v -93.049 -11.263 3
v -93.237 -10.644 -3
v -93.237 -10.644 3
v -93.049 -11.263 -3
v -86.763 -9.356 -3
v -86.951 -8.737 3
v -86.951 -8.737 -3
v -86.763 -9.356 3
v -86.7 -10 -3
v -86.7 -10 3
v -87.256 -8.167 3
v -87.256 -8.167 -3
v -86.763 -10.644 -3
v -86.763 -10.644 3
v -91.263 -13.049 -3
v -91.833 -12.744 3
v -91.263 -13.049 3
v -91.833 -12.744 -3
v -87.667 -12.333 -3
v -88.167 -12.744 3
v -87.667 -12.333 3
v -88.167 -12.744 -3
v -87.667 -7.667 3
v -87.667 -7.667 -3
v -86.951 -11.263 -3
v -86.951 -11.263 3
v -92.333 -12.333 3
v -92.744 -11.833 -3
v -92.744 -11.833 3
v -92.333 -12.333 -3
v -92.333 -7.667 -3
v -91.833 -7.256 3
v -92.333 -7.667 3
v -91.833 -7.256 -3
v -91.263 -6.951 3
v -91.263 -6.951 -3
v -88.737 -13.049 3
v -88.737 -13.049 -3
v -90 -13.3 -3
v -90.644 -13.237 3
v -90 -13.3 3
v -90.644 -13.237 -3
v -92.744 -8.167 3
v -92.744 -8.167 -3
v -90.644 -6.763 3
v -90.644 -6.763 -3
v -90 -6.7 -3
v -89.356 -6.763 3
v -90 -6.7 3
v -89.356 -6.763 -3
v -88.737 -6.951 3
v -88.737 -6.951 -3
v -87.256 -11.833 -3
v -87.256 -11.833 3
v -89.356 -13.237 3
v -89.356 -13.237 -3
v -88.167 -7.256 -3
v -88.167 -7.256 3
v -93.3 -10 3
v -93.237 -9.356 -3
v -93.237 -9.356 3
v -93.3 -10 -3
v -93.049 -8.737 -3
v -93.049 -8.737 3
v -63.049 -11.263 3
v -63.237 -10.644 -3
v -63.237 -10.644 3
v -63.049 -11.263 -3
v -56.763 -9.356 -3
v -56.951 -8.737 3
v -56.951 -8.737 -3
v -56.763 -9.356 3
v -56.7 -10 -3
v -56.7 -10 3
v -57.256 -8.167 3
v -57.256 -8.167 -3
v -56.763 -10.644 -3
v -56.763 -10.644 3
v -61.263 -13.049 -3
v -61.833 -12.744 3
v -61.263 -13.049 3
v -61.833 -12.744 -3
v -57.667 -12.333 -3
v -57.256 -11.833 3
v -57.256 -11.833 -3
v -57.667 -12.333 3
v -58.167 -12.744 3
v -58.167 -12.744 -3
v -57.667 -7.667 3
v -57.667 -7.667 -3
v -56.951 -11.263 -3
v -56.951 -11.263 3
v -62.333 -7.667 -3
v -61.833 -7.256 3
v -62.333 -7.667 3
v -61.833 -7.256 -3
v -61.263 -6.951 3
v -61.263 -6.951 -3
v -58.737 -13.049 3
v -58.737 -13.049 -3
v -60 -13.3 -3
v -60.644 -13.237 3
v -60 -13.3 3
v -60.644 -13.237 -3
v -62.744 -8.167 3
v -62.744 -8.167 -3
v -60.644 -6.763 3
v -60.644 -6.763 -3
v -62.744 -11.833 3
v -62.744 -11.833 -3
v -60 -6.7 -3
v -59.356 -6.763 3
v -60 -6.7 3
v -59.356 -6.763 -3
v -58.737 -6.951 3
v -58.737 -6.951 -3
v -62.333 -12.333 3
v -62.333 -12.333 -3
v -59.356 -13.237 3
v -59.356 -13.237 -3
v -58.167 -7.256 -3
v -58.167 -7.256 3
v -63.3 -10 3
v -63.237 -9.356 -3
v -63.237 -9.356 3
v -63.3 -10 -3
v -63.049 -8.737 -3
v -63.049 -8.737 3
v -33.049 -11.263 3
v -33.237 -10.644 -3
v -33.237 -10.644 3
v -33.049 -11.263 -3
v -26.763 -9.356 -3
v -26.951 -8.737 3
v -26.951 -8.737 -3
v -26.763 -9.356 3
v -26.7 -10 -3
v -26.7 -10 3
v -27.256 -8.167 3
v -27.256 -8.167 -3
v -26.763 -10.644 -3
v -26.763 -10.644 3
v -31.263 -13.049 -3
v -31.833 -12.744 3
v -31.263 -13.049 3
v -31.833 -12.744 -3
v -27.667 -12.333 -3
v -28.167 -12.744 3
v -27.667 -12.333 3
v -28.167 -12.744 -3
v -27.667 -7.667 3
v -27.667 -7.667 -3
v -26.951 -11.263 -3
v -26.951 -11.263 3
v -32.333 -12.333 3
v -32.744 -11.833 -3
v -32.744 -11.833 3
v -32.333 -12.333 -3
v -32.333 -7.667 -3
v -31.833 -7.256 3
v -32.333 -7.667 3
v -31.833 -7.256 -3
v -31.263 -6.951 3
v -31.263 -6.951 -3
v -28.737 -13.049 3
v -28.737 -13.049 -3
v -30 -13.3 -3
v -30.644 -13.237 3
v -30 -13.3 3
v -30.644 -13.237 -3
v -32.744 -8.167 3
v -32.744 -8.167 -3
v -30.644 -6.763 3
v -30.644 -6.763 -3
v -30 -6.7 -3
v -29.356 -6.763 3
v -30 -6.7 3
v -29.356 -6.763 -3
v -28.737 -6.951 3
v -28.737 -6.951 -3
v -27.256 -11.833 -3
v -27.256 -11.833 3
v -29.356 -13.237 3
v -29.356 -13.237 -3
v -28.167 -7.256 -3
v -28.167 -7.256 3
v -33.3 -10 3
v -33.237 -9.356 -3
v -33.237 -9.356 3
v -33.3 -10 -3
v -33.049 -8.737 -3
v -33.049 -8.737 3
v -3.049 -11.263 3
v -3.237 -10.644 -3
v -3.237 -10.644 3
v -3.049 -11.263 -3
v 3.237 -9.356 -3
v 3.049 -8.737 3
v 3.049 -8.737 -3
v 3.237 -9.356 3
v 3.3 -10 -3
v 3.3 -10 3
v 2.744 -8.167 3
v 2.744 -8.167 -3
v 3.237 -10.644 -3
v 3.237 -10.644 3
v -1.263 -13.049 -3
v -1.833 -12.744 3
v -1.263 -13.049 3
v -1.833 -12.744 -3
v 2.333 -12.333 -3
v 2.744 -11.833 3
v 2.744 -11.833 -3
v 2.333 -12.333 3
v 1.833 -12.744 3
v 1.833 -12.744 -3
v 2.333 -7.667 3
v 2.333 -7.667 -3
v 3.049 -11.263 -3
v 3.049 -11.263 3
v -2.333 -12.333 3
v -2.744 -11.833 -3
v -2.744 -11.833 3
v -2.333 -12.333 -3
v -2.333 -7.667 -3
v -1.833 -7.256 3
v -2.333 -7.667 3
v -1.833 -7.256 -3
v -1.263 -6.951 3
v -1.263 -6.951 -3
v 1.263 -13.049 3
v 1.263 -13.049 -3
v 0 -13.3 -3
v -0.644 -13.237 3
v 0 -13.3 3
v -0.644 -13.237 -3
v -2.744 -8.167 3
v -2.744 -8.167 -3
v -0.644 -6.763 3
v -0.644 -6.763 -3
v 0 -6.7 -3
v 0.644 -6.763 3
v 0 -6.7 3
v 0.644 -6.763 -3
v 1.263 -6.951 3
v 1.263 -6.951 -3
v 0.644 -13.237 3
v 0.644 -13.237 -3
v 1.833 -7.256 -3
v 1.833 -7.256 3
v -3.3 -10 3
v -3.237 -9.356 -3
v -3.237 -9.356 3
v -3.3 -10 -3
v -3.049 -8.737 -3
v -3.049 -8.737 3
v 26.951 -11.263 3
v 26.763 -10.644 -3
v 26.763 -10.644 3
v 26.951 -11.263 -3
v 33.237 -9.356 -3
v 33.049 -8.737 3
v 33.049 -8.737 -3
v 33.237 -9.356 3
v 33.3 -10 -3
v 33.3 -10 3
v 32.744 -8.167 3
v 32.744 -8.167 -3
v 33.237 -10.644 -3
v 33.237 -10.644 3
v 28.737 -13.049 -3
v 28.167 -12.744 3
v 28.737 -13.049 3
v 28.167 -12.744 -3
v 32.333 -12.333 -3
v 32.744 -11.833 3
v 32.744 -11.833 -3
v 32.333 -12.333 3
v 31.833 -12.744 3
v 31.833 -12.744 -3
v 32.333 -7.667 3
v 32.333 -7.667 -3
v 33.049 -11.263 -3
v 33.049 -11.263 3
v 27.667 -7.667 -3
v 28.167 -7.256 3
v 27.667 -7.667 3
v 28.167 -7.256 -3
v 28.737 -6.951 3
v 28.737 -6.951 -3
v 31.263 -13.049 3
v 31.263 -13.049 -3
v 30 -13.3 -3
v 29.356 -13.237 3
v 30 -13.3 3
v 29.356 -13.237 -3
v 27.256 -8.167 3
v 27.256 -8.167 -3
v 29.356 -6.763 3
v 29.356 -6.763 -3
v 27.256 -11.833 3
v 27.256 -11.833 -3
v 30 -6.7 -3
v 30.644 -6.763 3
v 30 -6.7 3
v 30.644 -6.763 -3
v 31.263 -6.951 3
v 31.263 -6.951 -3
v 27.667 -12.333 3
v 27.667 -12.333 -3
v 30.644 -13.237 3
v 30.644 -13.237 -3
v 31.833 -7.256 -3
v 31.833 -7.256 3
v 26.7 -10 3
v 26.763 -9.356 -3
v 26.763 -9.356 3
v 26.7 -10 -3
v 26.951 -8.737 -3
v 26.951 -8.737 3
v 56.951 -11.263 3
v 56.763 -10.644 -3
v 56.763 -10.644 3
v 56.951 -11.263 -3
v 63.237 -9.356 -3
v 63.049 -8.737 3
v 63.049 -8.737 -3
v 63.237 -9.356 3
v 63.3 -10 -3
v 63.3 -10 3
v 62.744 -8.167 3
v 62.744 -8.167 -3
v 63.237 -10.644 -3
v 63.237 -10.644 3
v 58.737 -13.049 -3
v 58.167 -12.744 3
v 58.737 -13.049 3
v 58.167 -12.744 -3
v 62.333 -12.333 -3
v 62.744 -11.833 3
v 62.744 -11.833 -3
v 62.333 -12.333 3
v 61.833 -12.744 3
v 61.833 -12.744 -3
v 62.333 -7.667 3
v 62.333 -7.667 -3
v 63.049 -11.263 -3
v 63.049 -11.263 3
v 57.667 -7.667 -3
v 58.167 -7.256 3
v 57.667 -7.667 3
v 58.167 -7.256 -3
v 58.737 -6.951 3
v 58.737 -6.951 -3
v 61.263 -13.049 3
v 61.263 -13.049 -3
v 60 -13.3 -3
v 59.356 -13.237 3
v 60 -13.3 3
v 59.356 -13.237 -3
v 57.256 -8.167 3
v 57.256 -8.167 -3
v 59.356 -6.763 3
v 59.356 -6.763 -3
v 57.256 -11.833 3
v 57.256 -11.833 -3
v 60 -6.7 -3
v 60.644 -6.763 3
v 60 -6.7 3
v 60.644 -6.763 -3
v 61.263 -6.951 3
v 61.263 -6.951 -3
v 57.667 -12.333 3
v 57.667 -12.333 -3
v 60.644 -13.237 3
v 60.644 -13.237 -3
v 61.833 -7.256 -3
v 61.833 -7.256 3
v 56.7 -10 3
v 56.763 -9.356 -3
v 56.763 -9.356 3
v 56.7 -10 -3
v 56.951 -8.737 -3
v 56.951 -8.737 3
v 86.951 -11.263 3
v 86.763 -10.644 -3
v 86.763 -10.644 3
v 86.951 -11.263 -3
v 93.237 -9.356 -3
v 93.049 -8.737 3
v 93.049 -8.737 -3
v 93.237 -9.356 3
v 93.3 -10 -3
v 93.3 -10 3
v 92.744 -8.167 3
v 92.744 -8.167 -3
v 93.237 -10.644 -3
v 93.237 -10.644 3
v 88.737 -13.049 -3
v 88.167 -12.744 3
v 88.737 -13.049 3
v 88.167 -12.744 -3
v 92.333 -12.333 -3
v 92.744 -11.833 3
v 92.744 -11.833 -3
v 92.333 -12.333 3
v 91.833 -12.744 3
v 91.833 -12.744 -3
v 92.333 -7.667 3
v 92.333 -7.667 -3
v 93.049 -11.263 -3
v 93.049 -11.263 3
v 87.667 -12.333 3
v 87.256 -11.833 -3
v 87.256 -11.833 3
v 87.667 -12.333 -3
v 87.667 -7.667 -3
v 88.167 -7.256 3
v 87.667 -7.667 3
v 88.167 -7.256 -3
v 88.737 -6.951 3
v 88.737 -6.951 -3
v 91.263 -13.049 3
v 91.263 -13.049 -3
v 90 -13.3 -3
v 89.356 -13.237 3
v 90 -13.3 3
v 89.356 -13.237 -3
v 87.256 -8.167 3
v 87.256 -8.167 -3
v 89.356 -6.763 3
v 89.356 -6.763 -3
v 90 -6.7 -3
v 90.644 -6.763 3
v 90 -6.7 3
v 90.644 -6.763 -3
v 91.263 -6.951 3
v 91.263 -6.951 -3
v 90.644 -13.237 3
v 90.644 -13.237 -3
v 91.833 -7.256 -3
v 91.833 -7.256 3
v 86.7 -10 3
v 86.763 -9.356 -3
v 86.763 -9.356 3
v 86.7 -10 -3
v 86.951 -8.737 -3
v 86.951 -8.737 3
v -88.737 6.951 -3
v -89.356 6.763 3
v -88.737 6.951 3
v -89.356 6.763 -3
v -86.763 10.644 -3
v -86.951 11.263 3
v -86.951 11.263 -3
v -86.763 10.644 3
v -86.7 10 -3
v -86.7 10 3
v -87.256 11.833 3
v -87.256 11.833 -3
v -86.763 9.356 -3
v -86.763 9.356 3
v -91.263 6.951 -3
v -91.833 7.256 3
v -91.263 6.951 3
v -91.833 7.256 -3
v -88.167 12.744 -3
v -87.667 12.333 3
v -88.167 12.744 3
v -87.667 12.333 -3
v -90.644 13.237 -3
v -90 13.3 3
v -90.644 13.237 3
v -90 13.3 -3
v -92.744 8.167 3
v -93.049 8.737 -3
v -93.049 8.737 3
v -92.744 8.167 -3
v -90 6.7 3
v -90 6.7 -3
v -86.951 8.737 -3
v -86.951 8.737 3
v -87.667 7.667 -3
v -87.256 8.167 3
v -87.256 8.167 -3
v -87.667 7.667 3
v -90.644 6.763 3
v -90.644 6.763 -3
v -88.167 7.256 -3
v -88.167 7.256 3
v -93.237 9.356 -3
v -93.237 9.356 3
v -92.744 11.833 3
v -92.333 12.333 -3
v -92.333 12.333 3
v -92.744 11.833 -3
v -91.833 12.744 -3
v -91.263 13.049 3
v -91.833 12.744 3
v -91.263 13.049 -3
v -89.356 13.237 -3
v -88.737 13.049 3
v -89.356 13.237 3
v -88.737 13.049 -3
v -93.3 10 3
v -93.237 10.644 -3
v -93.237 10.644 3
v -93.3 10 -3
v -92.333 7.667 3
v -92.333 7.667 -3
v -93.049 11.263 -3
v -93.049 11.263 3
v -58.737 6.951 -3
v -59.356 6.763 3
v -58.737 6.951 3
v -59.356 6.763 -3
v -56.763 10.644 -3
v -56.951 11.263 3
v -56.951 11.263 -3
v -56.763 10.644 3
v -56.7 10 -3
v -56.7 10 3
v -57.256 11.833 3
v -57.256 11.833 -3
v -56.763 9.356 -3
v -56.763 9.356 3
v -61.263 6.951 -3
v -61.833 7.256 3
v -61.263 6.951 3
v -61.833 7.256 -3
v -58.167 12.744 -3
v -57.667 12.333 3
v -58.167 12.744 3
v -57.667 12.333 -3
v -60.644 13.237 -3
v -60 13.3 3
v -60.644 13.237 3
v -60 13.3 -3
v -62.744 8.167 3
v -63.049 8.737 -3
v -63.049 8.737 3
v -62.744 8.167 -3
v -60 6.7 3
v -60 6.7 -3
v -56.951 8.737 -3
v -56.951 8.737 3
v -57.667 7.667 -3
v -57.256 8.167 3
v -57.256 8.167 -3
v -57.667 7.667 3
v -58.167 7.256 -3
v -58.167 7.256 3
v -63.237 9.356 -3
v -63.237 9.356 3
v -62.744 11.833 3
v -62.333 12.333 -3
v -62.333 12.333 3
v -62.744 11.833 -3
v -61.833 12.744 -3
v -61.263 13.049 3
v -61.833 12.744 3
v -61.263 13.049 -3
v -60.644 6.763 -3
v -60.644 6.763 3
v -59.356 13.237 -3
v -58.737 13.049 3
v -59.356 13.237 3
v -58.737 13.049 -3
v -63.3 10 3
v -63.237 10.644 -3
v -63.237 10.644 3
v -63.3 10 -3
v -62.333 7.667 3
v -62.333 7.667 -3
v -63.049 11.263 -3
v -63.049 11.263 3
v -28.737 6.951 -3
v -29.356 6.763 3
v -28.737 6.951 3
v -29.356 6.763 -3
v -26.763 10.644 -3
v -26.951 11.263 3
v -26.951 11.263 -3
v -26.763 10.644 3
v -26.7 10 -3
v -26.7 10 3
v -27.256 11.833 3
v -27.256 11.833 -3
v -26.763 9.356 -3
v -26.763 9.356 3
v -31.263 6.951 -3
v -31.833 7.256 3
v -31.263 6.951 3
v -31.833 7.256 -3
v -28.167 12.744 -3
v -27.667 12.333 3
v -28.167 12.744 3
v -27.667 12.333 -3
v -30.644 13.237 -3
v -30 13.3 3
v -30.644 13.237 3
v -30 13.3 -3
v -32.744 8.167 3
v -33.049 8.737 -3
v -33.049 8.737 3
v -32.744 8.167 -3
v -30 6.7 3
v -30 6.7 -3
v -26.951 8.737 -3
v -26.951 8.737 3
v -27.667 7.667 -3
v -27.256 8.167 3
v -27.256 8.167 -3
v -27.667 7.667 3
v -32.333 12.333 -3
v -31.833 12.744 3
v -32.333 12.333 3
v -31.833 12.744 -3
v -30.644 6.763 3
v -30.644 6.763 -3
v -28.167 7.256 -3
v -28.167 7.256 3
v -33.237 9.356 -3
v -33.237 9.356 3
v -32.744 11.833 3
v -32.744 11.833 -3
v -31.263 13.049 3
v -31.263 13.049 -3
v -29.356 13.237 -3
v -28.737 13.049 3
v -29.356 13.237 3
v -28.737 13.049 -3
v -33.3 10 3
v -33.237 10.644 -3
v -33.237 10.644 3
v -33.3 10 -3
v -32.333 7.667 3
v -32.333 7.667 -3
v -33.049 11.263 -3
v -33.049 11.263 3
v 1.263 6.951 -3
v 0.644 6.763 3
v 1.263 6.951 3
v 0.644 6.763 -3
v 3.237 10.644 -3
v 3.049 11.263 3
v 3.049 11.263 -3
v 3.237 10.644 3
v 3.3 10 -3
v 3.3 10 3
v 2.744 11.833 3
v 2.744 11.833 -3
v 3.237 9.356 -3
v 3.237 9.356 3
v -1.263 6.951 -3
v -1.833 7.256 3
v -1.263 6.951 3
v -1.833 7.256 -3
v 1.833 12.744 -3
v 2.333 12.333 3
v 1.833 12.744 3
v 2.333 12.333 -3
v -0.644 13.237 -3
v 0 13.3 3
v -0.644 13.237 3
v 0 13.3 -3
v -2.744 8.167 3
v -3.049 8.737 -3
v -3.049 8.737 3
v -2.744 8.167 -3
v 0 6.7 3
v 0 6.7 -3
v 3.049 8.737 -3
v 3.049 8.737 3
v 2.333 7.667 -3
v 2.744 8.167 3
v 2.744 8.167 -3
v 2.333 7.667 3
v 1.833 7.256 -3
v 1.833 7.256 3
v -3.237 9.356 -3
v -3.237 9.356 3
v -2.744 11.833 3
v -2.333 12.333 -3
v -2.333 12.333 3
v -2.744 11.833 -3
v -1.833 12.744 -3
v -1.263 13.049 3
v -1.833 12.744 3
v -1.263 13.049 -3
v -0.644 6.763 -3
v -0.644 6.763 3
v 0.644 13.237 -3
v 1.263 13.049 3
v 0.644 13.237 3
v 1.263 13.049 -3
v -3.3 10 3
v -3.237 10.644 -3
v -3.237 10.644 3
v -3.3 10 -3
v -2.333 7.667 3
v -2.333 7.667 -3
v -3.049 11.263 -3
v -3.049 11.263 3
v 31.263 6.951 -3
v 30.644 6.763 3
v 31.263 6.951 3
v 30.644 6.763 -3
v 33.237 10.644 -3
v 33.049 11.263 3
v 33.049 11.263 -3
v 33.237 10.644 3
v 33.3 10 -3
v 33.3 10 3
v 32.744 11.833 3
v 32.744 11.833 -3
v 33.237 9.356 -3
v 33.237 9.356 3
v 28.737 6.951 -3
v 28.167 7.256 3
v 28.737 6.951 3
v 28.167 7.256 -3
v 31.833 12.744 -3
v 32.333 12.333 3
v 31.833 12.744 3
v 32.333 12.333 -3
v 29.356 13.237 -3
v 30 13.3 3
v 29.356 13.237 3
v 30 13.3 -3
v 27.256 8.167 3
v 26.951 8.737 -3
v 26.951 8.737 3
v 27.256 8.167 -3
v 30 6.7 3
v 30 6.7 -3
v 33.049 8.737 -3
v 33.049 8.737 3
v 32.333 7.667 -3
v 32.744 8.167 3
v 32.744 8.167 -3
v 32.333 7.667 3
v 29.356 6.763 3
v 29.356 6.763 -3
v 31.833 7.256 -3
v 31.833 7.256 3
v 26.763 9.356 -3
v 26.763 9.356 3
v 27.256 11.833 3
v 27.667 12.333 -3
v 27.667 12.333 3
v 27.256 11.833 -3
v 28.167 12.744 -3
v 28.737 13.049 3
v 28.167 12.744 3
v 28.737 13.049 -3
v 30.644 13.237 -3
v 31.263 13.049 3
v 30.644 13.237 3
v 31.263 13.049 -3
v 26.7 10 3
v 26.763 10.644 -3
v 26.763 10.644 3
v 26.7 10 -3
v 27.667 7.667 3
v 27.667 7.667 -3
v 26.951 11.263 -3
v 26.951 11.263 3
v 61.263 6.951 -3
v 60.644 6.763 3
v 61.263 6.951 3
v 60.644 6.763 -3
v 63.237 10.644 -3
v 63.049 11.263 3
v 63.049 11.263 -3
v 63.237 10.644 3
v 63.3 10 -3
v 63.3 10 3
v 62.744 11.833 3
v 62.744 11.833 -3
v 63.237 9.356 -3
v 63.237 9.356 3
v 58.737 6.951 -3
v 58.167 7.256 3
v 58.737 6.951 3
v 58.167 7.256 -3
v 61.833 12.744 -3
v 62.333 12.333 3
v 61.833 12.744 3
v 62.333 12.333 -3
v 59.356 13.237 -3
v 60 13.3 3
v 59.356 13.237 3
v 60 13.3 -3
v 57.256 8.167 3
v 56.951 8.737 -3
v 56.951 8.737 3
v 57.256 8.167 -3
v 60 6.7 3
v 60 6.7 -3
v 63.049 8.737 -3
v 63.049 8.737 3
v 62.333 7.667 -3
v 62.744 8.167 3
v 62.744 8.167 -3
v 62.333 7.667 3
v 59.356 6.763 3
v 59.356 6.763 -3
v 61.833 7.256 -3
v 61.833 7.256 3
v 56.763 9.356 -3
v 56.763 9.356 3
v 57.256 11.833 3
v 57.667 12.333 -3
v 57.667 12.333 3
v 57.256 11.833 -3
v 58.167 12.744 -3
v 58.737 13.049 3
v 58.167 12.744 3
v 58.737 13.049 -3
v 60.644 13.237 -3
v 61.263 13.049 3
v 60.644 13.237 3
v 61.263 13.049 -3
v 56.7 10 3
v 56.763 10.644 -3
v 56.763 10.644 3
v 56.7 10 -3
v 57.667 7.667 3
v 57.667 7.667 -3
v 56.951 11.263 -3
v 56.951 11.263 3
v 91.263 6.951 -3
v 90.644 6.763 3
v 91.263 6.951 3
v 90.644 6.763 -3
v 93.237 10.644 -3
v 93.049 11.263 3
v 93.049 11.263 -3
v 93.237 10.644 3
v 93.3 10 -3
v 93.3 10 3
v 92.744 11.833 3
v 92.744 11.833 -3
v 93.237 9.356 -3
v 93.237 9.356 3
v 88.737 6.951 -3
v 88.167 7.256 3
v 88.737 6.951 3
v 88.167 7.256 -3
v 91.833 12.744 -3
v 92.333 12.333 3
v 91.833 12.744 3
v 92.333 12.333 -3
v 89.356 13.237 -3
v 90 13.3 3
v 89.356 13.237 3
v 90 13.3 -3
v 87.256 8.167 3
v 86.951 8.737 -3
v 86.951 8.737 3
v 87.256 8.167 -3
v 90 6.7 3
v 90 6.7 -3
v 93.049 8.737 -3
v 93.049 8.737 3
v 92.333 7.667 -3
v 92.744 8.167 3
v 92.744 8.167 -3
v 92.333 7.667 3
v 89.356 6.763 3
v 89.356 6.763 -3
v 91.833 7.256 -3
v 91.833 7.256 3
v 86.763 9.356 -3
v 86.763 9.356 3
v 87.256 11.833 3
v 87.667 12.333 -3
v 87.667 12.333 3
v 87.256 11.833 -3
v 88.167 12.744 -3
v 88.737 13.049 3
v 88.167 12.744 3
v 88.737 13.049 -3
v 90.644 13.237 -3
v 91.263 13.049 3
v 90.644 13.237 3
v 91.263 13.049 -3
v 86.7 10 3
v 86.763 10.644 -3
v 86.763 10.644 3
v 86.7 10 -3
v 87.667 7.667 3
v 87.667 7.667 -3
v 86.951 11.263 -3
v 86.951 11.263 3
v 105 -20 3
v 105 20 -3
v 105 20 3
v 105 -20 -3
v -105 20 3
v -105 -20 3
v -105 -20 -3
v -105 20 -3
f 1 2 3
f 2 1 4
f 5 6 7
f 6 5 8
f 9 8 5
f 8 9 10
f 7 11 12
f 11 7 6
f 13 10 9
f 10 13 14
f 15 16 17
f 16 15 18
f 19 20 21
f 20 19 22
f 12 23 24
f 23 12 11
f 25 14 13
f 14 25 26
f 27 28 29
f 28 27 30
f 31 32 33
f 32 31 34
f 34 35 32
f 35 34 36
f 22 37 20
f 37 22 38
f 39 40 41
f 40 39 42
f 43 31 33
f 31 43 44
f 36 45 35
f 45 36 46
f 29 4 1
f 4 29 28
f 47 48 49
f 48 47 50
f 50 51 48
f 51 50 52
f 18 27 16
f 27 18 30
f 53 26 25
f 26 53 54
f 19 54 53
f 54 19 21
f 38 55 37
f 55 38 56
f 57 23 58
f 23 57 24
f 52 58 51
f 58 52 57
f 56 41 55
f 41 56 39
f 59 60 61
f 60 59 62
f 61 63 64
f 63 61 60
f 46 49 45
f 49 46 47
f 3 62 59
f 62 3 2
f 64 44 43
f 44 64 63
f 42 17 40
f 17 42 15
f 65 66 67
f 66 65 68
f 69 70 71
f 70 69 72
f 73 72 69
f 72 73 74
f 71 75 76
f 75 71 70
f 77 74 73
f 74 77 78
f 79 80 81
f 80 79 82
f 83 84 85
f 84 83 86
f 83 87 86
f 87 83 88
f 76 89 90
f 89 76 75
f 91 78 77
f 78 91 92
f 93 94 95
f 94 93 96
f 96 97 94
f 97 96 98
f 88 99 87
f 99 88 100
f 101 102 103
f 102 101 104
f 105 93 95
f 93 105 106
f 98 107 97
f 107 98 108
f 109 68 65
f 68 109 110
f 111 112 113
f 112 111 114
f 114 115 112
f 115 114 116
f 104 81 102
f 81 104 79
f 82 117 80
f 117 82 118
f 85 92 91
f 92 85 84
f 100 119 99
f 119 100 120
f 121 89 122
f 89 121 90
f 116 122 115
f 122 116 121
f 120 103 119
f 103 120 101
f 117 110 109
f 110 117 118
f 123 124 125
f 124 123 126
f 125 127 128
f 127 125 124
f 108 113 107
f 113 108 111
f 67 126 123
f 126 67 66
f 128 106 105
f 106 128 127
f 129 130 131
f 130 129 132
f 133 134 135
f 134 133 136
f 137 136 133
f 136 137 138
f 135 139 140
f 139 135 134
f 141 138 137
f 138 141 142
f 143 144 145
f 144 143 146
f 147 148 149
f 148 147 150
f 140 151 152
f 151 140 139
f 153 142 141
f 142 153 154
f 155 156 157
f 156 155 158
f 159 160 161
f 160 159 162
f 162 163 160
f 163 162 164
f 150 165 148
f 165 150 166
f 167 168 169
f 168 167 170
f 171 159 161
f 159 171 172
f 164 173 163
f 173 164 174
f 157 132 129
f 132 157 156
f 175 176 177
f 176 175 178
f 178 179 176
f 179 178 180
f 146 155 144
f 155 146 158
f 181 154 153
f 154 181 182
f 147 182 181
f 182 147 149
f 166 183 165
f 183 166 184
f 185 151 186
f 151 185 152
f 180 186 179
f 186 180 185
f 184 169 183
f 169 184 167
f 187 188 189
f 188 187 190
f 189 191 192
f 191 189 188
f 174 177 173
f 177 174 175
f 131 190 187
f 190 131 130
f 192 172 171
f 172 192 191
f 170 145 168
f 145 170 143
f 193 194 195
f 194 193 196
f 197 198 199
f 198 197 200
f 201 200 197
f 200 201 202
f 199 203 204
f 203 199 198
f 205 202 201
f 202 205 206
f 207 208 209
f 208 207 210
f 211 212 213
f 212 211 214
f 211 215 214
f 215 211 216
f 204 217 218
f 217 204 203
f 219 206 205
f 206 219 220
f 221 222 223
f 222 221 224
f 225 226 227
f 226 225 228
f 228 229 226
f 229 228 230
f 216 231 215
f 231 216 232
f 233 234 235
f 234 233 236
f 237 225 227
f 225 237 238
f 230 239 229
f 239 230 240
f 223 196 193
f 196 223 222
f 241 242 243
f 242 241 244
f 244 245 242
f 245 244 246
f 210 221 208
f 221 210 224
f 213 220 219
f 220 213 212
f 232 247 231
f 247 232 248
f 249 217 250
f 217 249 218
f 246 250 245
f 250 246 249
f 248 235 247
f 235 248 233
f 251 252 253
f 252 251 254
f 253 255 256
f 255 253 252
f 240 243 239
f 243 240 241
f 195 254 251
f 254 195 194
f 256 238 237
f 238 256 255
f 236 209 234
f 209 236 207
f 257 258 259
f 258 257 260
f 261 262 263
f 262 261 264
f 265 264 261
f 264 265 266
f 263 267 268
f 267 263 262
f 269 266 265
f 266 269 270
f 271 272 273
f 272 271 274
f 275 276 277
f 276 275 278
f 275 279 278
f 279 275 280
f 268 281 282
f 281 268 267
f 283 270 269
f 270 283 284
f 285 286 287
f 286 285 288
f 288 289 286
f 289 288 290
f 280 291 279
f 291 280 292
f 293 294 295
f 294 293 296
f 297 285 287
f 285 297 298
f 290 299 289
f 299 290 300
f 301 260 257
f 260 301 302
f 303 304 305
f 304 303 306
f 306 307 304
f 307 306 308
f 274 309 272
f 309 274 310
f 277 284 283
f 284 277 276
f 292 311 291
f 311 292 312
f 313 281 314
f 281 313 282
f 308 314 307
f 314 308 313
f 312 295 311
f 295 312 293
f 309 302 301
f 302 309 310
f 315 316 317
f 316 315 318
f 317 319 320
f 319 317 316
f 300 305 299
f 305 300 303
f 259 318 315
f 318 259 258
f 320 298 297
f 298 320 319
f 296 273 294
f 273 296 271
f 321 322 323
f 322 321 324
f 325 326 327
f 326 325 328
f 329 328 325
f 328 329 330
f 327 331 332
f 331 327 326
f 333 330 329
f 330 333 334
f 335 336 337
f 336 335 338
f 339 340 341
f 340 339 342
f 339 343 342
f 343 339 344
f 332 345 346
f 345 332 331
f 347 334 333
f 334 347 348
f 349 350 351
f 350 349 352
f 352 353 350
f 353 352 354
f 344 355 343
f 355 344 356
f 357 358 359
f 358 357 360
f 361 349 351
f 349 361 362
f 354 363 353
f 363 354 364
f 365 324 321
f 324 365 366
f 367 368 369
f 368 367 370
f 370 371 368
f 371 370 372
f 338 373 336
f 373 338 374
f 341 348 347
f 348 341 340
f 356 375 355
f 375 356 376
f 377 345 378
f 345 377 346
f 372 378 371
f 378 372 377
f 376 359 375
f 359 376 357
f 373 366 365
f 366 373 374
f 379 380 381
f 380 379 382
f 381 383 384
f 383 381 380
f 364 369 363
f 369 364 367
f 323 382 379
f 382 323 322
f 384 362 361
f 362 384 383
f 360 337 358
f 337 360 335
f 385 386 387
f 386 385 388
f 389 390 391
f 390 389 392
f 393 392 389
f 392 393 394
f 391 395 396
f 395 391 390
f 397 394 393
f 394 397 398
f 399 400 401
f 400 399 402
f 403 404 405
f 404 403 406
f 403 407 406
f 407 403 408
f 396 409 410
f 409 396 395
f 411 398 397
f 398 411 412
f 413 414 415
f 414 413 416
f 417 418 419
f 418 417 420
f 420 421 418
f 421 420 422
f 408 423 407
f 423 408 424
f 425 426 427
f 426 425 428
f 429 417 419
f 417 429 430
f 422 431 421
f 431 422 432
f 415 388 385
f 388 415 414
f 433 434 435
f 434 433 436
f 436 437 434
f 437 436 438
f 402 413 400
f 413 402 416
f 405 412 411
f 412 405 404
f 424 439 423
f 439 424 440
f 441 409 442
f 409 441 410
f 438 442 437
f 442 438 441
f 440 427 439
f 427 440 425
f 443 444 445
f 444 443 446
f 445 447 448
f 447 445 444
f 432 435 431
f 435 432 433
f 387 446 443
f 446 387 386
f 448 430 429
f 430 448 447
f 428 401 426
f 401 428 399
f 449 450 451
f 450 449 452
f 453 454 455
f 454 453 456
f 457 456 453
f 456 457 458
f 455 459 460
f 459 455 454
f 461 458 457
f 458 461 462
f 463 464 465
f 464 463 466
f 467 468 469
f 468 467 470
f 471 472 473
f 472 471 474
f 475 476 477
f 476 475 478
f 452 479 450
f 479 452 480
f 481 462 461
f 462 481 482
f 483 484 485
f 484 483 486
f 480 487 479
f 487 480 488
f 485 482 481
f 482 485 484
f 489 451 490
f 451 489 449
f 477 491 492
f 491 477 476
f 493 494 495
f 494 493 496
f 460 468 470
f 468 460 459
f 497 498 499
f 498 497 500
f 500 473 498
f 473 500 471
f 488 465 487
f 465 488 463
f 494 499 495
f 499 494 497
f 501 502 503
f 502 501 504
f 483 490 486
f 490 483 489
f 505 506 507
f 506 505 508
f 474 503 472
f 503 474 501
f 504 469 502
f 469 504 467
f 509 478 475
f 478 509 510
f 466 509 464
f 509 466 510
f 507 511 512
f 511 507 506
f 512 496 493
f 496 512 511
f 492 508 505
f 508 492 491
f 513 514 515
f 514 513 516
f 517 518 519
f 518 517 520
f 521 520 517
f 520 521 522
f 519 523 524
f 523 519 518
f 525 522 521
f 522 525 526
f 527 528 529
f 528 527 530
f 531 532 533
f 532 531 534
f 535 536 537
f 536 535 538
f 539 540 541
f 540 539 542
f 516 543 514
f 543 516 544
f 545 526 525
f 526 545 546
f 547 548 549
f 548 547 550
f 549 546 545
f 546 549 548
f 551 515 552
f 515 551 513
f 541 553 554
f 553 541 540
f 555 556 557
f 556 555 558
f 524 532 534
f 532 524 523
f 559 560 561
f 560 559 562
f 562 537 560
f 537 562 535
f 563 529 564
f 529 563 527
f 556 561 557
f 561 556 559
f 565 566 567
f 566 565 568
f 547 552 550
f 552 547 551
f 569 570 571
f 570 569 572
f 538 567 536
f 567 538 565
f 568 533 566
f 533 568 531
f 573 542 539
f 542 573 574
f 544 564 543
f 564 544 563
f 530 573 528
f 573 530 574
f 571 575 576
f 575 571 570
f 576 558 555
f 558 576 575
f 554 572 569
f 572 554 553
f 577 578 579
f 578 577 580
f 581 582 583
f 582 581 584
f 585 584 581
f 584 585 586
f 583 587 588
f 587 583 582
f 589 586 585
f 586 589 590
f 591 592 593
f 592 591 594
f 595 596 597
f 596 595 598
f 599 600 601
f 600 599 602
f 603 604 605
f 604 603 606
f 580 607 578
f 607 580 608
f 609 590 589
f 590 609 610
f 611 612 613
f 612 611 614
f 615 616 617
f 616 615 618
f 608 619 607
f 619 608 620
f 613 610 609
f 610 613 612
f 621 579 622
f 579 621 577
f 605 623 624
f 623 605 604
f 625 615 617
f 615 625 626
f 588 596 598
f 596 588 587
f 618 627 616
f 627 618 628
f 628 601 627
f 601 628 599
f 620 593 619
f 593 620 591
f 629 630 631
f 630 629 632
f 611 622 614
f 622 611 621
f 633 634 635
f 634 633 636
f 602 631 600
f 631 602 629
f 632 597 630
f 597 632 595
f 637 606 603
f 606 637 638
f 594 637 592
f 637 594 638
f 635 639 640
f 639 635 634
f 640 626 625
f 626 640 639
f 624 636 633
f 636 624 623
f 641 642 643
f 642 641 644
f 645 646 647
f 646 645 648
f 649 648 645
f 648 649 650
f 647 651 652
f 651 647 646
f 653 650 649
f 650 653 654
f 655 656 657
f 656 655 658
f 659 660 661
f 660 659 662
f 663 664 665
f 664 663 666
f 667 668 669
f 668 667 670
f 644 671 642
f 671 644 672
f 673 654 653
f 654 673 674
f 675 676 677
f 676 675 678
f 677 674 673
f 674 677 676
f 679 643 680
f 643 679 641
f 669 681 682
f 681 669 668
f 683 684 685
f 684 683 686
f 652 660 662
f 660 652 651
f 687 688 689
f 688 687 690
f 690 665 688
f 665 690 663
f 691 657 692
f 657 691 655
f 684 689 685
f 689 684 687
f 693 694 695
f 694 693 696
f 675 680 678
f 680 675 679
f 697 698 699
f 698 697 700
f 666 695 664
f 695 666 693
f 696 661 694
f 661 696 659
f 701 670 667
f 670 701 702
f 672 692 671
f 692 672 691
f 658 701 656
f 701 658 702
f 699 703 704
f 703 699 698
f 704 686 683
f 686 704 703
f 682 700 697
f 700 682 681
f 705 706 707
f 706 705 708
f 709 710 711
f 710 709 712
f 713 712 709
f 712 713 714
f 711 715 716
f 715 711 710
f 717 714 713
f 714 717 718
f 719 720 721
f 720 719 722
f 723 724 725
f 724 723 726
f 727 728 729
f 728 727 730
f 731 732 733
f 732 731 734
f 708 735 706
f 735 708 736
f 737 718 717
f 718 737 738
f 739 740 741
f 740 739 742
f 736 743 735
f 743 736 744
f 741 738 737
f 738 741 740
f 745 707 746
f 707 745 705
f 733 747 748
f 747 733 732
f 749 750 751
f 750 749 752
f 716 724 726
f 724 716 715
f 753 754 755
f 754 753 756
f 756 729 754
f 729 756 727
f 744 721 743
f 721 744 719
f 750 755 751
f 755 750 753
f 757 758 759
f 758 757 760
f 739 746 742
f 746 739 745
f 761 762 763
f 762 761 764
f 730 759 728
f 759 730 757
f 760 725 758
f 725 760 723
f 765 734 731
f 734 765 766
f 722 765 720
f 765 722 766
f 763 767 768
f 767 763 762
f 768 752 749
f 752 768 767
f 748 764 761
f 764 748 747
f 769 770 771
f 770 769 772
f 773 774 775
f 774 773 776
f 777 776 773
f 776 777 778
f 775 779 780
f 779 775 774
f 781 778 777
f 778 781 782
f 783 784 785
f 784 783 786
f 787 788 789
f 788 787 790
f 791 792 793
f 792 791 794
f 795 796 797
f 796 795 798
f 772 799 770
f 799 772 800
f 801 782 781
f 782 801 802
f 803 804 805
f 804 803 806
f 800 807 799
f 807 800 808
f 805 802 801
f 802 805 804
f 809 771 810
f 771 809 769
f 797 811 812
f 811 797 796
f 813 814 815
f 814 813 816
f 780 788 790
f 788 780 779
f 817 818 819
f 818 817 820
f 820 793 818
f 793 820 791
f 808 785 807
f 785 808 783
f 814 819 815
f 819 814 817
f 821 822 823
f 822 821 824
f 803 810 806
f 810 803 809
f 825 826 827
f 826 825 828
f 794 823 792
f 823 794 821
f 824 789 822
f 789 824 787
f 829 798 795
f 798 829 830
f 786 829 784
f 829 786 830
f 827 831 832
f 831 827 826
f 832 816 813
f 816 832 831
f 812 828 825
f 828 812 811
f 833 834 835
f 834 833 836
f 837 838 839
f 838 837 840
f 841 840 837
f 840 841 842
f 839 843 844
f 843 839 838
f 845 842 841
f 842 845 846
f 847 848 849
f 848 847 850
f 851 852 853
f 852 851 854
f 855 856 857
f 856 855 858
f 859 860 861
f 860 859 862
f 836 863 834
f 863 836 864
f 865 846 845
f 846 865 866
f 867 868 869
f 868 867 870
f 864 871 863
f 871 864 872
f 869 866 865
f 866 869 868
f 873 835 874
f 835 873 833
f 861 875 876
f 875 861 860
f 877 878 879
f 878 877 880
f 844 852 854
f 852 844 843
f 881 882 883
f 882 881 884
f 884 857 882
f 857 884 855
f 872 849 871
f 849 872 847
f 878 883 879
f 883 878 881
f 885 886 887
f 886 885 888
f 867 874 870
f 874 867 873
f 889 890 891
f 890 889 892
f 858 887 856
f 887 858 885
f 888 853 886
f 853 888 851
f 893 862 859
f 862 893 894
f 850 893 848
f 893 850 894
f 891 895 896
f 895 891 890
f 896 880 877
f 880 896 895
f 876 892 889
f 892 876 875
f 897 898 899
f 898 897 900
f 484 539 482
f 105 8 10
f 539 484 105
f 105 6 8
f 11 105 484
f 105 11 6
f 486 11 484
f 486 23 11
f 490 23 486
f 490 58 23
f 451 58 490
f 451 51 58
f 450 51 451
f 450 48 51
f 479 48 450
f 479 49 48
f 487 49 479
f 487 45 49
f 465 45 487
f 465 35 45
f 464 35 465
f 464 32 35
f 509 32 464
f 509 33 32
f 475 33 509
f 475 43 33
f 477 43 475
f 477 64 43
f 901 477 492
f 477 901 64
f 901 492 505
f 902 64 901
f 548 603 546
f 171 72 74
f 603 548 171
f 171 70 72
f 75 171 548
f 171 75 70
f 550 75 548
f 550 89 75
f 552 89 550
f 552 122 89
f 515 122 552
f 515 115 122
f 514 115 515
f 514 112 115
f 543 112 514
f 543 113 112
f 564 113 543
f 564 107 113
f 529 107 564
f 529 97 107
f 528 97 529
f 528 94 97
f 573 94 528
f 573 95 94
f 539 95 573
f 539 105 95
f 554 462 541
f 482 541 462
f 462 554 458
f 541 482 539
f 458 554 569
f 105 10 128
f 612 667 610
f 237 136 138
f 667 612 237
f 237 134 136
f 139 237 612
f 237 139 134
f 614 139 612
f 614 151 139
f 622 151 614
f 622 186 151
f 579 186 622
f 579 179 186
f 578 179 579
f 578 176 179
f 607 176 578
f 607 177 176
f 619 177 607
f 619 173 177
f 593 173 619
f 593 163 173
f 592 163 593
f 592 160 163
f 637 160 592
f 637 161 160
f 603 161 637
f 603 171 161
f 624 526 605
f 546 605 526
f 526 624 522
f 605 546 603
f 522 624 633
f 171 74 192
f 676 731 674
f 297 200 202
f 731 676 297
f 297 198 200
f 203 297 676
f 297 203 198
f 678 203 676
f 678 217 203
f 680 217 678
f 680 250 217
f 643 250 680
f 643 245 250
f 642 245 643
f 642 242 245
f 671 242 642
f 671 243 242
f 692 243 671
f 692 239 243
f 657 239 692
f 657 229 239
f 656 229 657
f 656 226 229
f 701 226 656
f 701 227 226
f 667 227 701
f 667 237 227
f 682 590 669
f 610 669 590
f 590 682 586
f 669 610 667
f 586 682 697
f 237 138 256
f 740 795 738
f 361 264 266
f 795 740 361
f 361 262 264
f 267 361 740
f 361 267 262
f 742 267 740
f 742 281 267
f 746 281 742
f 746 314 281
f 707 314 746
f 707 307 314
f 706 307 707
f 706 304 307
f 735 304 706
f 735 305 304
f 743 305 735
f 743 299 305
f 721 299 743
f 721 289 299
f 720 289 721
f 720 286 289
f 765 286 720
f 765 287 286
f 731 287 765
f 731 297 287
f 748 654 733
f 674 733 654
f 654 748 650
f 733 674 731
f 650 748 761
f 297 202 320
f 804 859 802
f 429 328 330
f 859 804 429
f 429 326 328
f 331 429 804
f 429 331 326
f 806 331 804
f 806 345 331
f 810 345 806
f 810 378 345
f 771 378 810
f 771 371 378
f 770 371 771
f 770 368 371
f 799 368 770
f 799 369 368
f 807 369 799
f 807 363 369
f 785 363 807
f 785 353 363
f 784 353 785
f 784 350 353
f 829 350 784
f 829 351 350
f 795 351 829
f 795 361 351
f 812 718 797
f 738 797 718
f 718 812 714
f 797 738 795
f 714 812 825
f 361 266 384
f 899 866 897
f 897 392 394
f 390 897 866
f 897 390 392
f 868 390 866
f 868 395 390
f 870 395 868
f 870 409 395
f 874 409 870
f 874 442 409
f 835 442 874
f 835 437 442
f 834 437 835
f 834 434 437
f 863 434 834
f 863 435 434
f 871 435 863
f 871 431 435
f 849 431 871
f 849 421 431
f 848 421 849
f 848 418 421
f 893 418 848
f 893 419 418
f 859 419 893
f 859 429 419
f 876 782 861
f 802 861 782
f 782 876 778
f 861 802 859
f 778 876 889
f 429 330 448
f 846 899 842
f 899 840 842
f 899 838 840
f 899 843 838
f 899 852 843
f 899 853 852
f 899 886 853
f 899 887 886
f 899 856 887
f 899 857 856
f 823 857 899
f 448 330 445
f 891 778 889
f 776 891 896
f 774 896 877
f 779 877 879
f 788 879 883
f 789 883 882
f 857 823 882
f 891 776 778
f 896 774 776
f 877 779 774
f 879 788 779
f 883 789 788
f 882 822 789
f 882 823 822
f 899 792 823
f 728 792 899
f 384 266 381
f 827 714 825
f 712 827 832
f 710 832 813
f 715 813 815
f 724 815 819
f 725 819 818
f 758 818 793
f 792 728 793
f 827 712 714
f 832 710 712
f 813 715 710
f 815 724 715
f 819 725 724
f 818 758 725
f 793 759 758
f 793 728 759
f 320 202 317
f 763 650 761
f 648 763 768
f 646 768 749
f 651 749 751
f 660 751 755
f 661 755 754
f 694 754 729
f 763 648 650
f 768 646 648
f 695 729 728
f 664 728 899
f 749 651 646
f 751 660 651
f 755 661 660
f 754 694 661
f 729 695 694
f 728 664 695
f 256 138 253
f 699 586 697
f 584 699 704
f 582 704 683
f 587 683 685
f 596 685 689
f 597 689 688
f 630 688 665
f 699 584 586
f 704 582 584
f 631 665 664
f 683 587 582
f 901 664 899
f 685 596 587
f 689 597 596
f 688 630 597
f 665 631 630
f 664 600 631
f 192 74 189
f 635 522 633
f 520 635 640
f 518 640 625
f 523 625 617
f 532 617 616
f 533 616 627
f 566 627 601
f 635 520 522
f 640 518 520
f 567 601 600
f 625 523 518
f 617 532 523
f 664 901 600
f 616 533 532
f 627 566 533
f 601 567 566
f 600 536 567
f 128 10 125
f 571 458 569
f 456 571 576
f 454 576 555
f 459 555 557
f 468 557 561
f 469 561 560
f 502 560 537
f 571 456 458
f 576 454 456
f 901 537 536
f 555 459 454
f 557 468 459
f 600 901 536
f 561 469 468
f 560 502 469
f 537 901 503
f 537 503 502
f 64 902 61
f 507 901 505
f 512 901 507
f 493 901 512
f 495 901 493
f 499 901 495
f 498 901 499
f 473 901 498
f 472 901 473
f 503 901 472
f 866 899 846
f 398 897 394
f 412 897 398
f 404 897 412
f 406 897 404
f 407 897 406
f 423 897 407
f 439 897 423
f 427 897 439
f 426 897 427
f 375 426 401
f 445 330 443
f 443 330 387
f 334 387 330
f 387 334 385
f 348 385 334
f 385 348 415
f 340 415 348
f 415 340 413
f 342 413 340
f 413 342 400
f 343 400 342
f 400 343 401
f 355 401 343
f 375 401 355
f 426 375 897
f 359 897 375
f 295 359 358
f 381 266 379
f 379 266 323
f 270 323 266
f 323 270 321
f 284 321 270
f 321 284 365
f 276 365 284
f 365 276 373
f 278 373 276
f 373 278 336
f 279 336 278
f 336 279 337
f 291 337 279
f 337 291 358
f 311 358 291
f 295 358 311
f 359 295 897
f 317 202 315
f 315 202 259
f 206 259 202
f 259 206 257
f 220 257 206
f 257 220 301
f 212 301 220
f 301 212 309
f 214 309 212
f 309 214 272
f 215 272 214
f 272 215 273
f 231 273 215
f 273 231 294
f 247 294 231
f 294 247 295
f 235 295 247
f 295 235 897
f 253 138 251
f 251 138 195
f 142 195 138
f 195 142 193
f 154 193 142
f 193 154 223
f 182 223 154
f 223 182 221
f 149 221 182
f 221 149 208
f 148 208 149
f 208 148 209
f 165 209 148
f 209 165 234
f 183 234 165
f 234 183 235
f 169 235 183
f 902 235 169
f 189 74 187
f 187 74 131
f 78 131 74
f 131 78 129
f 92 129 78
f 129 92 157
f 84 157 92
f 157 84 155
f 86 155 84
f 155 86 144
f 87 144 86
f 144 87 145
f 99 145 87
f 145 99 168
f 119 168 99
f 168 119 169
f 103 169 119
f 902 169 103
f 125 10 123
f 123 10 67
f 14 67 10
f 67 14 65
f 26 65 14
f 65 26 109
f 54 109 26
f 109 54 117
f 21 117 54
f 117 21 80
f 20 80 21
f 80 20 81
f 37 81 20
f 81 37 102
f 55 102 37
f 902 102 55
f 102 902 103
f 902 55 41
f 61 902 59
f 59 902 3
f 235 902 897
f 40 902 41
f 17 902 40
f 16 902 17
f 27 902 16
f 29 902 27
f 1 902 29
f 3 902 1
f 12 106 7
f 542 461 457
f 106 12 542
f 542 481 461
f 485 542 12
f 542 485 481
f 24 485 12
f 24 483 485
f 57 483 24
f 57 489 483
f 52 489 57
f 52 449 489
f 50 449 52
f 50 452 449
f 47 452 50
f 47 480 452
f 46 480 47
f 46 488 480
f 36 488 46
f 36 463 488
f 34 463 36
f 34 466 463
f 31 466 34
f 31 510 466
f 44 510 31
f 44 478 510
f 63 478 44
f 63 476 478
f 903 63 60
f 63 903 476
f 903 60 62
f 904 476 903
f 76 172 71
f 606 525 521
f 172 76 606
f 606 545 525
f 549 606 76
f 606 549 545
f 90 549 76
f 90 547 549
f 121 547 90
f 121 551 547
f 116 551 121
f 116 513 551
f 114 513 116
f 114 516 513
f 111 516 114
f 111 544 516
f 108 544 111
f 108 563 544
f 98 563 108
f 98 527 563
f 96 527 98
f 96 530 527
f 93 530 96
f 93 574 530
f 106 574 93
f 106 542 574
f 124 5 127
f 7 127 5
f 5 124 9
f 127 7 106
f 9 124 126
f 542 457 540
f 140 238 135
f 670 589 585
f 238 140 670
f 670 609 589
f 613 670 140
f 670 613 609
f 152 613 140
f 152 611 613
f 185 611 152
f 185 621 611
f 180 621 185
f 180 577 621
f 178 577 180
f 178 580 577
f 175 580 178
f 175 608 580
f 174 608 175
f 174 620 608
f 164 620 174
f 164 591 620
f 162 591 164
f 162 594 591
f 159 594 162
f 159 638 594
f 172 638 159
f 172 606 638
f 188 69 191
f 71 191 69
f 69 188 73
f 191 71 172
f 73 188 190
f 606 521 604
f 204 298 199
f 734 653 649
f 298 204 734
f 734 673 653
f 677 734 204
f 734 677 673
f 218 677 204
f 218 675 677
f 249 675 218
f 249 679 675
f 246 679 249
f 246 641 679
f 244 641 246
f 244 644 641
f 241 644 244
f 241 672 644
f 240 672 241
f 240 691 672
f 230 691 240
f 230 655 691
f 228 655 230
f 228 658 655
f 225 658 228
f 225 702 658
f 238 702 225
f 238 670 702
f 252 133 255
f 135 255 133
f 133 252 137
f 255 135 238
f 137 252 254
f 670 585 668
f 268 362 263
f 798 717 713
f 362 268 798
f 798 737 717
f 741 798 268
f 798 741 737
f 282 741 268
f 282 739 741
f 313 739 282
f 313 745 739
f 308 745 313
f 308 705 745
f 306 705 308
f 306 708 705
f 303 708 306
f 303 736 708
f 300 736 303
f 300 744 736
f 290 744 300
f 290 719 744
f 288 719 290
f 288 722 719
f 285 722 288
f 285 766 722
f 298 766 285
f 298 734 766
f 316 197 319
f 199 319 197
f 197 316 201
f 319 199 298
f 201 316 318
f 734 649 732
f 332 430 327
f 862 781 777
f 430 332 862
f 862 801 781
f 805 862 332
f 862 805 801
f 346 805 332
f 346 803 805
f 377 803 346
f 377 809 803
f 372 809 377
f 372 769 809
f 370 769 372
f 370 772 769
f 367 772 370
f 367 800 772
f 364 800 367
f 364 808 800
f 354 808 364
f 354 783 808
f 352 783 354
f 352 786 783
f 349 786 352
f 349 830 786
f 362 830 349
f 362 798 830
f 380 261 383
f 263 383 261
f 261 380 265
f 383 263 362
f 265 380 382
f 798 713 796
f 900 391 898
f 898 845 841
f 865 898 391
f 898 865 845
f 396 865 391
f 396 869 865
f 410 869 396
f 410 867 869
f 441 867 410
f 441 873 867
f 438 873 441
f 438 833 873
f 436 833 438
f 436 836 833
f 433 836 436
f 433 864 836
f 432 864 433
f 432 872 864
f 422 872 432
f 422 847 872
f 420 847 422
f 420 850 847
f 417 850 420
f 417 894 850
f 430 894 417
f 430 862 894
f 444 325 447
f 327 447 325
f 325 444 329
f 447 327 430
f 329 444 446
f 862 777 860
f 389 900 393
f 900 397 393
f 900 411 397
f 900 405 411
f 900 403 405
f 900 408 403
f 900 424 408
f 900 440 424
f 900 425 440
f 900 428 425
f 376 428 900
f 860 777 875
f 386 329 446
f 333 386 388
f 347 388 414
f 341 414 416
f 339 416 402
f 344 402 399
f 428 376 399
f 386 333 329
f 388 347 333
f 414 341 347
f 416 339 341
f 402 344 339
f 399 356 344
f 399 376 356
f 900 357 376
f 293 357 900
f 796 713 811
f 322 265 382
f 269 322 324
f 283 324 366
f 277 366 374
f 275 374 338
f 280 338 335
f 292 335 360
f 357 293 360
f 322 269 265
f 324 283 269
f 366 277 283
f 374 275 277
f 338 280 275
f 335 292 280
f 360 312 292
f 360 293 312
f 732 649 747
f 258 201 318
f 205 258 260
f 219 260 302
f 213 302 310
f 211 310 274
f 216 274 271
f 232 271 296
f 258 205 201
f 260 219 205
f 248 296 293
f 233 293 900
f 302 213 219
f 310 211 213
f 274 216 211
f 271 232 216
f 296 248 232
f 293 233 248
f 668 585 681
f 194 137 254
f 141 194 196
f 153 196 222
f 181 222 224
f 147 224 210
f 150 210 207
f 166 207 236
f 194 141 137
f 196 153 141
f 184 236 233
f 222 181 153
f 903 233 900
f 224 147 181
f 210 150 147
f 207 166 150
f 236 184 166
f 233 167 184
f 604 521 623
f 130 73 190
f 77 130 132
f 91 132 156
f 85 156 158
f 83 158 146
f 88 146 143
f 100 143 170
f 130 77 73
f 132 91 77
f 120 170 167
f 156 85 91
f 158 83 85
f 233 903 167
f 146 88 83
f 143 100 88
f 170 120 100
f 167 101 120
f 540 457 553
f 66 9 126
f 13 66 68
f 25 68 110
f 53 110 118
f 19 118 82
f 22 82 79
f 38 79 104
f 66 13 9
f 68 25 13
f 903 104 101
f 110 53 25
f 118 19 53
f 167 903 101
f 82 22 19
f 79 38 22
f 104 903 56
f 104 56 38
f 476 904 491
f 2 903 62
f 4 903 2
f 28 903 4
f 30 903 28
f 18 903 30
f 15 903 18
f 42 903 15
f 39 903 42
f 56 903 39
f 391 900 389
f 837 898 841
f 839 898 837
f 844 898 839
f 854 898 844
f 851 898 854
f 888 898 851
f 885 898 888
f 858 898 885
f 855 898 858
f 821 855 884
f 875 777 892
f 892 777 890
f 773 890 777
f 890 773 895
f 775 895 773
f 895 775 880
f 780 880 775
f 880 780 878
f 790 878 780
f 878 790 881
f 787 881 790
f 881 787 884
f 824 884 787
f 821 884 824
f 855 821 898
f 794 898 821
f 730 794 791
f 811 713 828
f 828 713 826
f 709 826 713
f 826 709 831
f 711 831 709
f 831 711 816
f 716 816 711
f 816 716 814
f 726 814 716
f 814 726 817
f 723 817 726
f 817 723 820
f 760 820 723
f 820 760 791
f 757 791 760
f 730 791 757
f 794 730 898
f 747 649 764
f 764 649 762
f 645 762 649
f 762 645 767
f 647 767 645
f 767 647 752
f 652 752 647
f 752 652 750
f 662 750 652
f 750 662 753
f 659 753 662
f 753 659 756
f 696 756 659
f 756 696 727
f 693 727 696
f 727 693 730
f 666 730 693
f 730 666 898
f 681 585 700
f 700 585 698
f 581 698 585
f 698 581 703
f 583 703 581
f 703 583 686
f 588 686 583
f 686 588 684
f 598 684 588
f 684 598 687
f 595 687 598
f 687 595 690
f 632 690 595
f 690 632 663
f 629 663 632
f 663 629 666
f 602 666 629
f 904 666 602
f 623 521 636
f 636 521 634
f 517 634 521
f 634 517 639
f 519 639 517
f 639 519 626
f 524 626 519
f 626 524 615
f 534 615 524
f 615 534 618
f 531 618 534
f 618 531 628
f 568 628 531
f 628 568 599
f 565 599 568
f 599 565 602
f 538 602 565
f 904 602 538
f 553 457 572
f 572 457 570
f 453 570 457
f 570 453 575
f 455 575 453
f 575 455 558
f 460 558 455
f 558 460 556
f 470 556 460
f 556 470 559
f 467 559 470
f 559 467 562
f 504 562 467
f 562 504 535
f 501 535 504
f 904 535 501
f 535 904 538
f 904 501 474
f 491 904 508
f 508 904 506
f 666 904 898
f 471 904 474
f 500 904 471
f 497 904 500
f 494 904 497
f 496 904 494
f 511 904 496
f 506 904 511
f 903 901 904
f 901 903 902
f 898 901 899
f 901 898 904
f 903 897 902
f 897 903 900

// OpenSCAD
$fn = 32;

// ----------------------------------------------------------------------
// Hole bar, 7 x Ø6.6
// tworows layout, 15 mm edge offset
// ----------------------------------------------------------------------

// --- parameters (mm) ---
bar_w = 40;       // bar width (Y)
bar_t = 6;        // bar thickness (Z)
holes = 7;        // holes per row
hole_d = 6.6;     // hole diameter
edge = 15;        // offset from the bar end to the first hole
pitch = 30;       // pitch between neighbouring holes
row_offset = 20;  // distance between the two rows

// --- derived feature positions (mm) ---
span = (holes - 1) * pitch;   // = 180   distance between the end holes
bar_l = span + 2 * edge;      // = 210   overall bar length
start_x = -bar_l / 2 + edge;  // = -90   X of the first hole
feature_centers = [
  [start_x + 0 * pitch, -row_offset / 2],
  [start_x + 1 * pitch, -row_offset / 2],
  [start_x + 2 * pitch, -row_offset / 2],
  [start_x + 3 * pitch, -row_offset / 2],
  [start_x + 4 * pitch, -row_offset / 2],
  [start_x + 5 * pitch, -row_offset / 2],
  [start_x + 6 * pitch, -row_offset / 2]
];   // hole centres of the first row
row2_centers = [
  [start_x + 0 * pitch, row_offset / 2],
  [start_x + 1 * pitch, row_offset / 2],
  [start_x + 2 * pitch, row_offset / 2],
  [start_x + 3 * pitch, row_offset / 2],
  [start_x + 4 * pitch, row_offset / 2],
  [start_x + 5 * pitch, row_offset / 2],
  [start_x + 6 * pitch, row_offset / 2]
];   // hole centres of the second row

// bar with two rows of holes, both read from their own centre arrays
difference() {
  translate([-bar_l / 2, -bar_w / 2, -bar_t / 2]) cube([bar_l, bar_w, bar_t]);
  for (centre = feature_centers)
    translate([centre[0], centre[1], 0])
      cylinder(d = hole_d, h = bar_t + 2, center = true);
  for (centre = row2_centers)
    translate([centre[0], centre[1], 0])
      cylinder(d = hole_d, h = bar_t + 2, center = true);
}
